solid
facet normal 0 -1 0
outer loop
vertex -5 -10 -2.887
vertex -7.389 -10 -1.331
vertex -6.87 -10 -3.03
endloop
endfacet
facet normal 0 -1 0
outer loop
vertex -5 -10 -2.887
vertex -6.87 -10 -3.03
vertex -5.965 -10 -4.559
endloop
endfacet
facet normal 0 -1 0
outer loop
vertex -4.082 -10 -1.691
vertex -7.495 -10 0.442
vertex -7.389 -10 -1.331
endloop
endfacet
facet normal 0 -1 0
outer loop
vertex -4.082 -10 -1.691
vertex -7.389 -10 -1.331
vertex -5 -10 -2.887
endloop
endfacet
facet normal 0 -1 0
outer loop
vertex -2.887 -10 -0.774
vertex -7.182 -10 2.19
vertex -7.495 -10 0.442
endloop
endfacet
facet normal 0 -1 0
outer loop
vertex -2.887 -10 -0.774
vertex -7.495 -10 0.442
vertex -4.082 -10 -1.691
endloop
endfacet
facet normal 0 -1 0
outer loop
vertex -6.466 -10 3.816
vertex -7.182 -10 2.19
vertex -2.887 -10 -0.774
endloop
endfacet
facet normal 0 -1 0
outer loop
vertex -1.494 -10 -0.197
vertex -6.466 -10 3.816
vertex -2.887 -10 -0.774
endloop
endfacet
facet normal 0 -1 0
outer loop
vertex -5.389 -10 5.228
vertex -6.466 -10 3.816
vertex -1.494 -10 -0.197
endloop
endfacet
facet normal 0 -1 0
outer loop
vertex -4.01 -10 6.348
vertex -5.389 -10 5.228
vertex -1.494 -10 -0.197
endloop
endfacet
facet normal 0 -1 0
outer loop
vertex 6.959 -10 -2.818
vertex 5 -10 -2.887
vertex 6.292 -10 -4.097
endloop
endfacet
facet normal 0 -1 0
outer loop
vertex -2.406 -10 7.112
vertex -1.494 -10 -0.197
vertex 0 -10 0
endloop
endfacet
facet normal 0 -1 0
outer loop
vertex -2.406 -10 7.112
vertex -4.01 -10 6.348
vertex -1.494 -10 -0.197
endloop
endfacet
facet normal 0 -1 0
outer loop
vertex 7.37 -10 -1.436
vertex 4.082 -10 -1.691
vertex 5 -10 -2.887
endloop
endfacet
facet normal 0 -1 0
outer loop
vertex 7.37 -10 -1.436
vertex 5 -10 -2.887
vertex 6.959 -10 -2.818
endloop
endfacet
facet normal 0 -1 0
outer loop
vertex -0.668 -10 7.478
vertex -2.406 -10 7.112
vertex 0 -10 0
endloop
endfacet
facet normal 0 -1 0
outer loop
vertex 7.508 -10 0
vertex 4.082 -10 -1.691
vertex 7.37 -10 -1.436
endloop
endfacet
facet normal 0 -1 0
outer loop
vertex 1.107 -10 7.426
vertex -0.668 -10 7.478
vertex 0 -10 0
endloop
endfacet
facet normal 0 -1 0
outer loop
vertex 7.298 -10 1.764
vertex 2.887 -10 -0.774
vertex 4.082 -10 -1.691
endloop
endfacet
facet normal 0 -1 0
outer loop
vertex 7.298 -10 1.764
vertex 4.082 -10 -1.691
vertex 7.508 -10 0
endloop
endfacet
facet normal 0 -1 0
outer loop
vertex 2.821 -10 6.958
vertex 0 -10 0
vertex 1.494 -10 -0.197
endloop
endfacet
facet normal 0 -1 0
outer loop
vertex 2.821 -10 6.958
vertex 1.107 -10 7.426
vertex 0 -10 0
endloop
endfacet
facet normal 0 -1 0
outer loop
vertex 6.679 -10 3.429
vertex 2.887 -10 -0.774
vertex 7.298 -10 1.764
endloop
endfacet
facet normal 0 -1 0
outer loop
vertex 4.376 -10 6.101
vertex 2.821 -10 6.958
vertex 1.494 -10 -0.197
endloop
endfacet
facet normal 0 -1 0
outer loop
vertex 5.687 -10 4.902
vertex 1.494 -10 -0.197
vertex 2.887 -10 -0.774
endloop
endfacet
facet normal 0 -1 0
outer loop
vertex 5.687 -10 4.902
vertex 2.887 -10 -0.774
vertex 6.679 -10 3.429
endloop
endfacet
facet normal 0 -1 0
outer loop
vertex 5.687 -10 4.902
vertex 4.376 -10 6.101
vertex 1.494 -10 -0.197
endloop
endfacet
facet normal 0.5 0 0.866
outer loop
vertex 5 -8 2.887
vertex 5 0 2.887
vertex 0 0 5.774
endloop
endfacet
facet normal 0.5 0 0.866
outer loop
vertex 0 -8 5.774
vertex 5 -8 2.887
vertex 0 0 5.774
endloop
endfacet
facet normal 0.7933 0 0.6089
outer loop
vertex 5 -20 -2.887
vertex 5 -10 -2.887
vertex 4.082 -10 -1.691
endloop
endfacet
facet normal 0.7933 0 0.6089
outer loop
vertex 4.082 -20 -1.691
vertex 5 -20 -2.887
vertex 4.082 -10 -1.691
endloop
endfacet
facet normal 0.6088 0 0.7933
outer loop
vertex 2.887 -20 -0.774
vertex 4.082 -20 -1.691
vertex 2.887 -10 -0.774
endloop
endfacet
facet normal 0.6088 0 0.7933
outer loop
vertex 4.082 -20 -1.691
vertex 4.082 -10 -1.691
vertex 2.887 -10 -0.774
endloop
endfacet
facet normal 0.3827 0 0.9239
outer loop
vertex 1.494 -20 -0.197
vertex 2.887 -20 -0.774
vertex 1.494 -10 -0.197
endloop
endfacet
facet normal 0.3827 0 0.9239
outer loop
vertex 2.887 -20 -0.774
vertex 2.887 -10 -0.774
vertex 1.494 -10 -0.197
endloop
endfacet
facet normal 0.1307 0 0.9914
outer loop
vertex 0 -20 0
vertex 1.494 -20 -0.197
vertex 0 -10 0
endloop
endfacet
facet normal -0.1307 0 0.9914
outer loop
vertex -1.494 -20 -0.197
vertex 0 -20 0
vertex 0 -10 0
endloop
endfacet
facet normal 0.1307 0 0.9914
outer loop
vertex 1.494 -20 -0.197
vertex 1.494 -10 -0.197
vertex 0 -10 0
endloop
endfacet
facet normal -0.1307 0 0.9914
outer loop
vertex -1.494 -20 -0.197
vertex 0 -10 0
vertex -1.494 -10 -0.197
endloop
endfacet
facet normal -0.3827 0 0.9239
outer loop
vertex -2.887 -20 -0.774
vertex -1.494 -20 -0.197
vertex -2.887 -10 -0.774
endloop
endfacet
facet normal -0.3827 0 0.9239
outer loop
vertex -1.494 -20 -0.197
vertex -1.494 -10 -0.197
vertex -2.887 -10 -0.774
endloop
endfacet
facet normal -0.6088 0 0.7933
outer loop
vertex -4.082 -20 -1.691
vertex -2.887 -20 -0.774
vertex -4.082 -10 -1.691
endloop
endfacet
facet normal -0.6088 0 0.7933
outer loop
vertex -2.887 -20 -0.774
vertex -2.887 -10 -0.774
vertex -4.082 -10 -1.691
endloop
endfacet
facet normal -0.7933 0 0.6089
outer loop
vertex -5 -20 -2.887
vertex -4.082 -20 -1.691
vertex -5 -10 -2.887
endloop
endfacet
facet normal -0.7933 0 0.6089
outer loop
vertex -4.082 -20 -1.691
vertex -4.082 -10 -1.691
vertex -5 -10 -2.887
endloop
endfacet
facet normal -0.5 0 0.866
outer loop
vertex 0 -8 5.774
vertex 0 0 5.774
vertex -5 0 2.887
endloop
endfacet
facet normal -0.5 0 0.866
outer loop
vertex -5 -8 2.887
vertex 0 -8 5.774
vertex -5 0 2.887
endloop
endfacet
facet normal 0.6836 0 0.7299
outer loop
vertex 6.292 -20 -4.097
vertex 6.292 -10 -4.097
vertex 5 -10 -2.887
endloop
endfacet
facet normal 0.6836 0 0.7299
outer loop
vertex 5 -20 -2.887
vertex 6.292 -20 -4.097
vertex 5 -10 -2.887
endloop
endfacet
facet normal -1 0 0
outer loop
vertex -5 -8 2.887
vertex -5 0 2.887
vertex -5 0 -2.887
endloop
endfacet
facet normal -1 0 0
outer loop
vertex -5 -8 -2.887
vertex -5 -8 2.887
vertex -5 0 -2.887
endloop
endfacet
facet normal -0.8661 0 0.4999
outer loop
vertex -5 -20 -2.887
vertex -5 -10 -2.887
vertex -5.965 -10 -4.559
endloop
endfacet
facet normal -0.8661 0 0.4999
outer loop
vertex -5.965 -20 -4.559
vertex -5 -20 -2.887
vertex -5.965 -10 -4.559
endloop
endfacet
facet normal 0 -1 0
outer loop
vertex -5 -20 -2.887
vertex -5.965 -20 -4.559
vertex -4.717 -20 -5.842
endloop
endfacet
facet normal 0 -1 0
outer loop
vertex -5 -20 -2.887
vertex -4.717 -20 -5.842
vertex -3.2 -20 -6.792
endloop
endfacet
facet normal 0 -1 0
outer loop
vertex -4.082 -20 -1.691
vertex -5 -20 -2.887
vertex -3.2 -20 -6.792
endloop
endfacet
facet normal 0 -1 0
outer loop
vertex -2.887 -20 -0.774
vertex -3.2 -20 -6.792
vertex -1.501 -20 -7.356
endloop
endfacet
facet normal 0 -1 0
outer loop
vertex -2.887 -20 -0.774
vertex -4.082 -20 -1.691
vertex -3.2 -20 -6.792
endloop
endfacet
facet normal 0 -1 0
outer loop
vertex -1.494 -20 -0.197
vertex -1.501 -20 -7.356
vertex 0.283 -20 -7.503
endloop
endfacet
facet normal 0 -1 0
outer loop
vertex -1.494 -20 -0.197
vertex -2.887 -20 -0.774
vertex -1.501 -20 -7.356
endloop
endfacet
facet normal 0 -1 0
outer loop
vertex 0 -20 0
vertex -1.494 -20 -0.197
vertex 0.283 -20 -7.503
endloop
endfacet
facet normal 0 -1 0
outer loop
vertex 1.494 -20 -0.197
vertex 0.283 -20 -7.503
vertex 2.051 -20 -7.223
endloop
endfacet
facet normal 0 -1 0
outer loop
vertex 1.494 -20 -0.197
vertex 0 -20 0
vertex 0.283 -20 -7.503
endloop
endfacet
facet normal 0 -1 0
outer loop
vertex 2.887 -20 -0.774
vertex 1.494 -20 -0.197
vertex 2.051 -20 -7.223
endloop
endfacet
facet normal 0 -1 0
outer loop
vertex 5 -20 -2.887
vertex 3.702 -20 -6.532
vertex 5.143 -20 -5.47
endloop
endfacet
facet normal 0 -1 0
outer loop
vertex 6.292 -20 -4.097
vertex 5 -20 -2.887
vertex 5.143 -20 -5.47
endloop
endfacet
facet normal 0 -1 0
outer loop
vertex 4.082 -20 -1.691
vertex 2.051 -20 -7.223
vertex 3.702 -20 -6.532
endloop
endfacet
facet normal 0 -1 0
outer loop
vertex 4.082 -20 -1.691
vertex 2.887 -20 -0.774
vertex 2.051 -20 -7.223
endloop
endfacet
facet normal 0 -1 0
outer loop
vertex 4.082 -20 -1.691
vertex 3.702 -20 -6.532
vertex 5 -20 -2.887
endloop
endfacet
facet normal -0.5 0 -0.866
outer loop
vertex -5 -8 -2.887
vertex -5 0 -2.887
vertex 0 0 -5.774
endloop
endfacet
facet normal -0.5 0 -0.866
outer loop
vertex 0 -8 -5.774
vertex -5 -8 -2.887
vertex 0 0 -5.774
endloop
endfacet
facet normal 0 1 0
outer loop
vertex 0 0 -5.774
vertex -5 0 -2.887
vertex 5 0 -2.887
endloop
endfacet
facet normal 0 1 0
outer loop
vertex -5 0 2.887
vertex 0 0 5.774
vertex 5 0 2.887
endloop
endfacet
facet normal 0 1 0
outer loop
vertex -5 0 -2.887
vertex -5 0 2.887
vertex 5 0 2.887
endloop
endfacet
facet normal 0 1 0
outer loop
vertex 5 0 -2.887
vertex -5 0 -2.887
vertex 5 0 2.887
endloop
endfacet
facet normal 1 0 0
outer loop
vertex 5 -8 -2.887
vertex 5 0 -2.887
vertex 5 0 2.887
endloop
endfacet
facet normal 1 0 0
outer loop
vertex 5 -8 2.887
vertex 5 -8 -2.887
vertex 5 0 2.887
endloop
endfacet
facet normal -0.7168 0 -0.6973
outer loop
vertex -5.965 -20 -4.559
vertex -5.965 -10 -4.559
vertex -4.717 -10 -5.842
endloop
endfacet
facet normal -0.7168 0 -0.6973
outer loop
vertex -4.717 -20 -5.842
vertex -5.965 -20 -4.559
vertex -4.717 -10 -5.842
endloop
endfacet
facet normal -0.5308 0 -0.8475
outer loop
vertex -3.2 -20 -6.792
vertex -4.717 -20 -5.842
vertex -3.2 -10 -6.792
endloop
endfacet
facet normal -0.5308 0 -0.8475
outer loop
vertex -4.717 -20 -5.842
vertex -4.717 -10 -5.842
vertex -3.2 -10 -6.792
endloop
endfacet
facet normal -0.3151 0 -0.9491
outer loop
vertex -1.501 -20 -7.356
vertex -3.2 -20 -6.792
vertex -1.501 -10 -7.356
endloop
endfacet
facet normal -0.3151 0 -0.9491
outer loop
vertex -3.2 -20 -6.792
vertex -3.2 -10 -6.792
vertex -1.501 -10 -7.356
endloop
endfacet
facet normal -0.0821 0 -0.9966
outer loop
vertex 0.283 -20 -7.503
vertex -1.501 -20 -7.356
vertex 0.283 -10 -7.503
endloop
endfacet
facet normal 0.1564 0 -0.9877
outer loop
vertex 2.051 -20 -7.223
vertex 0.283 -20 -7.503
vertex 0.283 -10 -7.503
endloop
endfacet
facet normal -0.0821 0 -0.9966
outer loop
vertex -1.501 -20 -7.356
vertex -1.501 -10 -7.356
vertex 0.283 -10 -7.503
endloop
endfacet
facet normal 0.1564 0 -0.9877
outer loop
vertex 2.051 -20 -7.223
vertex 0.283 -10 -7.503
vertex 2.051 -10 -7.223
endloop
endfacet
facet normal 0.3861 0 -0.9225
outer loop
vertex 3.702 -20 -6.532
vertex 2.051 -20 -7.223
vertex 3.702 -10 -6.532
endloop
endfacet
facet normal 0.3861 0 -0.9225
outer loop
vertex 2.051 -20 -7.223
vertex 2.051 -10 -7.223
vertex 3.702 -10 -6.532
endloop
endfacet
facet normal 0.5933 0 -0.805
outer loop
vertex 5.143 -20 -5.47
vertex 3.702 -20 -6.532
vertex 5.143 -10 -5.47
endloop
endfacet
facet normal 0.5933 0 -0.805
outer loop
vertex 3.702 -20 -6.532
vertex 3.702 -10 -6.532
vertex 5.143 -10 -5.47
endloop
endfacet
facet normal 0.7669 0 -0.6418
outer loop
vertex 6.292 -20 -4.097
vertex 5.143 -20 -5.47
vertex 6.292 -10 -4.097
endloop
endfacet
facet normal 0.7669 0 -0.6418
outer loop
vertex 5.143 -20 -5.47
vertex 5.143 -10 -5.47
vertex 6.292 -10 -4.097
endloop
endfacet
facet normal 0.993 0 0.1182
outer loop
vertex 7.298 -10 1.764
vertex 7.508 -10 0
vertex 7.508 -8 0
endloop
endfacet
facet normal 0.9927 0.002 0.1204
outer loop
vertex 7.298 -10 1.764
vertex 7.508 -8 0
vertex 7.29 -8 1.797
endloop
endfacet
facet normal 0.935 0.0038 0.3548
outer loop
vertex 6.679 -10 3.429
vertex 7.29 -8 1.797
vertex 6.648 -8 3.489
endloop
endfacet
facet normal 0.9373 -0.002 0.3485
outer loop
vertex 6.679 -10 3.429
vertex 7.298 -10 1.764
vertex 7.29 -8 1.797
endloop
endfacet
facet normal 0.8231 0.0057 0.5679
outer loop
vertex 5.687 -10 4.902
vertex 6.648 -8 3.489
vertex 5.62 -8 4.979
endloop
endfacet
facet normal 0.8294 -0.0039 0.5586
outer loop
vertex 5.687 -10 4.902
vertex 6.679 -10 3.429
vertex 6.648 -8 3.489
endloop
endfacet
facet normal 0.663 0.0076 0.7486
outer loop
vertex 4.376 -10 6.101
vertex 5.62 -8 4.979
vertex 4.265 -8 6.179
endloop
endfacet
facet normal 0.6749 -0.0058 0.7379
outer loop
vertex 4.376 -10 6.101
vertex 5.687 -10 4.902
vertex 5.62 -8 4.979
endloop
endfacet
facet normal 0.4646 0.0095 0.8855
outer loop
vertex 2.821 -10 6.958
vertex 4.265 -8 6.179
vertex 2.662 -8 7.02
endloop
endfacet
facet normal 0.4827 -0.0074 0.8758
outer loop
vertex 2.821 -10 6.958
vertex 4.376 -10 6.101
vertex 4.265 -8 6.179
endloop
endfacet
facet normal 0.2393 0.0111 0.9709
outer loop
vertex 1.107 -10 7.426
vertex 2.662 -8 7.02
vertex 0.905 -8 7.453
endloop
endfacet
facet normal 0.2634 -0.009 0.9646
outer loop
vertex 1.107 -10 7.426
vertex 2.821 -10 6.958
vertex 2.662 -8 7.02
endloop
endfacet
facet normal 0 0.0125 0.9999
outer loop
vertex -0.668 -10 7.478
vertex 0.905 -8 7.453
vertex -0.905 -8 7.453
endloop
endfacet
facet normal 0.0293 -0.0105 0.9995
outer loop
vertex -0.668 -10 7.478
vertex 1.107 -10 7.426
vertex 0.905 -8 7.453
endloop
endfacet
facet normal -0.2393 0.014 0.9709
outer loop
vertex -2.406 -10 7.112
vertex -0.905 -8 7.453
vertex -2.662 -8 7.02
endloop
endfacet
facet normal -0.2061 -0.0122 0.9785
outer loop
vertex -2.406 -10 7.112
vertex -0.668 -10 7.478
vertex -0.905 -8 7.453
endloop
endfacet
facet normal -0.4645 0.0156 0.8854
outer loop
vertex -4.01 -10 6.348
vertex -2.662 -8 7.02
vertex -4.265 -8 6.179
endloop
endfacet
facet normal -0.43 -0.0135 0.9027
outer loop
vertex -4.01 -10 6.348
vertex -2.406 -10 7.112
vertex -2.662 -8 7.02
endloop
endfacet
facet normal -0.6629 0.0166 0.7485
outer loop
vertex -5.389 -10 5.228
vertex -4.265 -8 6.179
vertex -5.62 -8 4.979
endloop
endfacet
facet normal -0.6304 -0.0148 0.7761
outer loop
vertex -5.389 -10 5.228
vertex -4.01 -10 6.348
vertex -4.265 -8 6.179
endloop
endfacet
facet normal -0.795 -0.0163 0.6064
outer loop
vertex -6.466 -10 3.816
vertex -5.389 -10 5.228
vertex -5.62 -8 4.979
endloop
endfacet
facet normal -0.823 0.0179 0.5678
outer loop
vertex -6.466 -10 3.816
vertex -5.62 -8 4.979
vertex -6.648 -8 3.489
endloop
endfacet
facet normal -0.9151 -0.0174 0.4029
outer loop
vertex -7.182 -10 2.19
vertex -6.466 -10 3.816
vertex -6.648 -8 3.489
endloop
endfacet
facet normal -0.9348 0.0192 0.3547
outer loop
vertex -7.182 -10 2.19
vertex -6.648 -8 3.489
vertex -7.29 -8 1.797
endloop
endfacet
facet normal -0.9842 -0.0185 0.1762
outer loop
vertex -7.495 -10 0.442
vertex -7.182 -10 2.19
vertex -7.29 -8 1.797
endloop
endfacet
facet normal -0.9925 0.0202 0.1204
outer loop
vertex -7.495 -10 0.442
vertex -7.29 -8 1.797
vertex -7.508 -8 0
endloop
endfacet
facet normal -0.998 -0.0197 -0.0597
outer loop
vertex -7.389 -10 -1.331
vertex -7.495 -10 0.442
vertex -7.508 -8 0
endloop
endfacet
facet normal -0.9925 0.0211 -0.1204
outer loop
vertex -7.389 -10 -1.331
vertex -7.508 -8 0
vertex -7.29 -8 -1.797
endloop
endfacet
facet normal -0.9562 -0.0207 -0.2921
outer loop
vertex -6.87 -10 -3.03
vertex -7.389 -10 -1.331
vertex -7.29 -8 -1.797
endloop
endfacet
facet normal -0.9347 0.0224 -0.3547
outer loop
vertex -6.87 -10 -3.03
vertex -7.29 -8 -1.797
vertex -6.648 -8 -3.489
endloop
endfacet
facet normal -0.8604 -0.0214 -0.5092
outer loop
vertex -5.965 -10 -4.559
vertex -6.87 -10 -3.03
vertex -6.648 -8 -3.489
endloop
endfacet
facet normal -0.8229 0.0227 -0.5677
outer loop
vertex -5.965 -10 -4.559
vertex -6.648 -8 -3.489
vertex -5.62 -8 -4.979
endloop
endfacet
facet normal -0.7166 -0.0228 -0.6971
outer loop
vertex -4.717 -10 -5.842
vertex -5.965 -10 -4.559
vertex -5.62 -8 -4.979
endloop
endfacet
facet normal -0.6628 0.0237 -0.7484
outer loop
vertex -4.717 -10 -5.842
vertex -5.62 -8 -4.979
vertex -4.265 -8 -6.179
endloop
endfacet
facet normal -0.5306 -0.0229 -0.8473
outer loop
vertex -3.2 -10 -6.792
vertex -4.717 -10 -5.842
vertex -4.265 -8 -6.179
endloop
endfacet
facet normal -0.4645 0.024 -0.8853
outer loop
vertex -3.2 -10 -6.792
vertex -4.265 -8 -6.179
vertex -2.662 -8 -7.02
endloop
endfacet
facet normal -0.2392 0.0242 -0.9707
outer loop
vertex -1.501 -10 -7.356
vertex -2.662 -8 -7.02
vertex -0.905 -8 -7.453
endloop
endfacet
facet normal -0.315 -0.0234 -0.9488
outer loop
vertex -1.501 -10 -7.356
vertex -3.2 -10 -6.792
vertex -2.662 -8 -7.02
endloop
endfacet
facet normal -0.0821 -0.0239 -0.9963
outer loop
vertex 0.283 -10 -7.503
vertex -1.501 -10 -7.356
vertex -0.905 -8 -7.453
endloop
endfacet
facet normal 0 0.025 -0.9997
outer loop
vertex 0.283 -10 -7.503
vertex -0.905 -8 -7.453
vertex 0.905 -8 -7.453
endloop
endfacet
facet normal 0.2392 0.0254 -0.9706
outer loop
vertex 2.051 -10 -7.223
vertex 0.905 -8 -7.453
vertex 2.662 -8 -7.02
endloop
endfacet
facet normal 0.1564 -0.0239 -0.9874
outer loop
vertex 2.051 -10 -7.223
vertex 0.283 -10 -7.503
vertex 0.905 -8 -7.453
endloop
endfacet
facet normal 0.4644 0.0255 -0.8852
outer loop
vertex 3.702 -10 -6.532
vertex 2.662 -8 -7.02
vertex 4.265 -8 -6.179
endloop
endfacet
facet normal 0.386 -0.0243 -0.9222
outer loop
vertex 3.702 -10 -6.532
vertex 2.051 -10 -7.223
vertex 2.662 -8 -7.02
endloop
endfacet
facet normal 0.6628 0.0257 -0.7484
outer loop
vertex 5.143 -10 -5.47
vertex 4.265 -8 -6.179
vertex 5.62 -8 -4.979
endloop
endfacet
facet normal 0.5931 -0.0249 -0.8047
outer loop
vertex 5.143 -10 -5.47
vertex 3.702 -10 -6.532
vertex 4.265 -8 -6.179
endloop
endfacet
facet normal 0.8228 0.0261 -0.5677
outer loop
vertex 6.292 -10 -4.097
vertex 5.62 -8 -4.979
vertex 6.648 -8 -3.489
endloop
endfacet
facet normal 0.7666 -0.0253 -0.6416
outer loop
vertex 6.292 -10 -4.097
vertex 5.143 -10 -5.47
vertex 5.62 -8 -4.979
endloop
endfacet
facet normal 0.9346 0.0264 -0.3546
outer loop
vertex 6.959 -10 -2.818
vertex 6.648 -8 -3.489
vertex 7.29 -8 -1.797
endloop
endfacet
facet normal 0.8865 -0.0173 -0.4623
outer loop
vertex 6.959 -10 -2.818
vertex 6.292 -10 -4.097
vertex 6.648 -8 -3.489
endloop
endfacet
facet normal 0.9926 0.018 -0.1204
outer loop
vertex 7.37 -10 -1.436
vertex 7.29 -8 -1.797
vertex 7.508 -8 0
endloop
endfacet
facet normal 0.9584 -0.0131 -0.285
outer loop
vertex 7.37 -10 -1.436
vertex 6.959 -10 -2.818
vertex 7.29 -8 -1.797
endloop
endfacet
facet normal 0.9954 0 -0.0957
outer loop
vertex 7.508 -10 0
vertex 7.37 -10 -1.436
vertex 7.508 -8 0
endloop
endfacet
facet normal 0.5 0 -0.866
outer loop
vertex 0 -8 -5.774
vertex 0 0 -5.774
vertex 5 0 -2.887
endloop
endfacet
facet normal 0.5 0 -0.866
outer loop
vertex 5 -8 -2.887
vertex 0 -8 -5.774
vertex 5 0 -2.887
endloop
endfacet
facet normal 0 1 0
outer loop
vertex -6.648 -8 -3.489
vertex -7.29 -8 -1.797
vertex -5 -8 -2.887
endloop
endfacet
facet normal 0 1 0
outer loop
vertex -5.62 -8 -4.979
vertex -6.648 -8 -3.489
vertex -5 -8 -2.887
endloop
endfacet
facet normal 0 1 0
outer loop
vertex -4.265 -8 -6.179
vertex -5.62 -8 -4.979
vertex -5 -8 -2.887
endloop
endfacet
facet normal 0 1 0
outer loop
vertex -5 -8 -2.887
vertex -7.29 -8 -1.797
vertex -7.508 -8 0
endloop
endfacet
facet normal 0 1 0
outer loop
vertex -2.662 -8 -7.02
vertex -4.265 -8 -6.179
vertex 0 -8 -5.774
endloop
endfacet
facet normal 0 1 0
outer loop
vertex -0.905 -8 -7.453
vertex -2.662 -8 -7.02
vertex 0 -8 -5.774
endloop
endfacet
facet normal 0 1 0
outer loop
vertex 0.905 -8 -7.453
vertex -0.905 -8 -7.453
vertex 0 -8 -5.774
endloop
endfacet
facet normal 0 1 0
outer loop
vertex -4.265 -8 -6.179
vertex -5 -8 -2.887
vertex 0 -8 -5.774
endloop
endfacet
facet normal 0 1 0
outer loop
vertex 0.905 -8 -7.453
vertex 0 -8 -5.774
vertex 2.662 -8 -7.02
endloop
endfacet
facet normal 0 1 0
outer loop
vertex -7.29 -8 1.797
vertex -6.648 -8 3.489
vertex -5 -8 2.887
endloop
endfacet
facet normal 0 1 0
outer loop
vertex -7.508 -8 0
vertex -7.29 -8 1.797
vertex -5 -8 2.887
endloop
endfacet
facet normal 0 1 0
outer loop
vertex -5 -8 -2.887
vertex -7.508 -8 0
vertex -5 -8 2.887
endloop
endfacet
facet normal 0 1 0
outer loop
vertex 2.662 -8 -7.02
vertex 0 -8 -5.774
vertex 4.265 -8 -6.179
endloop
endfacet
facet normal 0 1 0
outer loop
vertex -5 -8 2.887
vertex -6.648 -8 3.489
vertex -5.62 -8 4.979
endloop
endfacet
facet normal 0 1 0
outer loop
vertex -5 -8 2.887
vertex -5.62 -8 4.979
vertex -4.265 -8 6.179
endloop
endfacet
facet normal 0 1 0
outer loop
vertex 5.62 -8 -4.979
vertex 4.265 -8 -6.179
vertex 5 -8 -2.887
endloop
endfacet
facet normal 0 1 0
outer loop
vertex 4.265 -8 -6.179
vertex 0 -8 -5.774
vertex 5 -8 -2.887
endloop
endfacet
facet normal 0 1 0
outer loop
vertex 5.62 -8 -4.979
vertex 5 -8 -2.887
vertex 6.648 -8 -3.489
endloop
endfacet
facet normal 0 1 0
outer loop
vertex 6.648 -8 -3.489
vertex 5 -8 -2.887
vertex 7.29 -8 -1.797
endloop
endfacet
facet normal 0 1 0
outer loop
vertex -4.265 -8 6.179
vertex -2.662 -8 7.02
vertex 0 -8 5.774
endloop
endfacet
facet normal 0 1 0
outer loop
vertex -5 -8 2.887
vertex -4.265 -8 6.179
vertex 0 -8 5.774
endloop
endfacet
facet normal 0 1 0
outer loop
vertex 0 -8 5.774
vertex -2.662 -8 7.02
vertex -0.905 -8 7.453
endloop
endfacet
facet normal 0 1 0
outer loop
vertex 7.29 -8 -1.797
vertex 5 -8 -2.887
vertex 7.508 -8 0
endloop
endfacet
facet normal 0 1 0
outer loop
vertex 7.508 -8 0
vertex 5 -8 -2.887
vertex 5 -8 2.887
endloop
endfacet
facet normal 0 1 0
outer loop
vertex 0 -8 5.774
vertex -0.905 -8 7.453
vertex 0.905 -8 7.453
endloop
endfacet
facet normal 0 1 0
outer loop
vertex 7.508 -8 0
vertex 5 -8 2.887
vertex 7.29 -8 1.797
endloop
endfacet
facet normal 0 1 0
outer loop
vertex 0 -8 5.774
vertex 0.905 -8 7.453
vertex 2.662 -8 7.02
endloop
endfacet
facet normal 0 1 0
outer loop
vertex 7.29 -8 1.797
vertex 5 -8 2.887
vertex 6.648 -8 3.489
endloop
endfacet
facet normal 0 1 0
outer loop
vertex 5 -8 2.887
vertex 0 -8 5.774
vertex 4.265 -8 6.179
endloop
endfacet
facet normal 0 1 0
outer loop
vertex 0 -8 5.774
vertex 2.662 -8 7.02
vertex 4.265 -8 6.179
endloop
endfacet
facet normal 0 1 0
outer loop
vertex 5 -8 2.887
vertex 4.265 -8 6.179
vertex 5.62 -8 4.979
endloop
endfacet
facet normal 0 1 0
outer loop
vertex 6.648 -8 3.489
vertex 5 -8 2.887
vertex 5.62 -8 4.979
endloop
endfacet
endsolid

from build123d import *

# Parameters (mm, degrees)
F1_DEPTH = 10
F3_DEPTH = 10
F4_R     = 7.5080974038
F5_DEPTH = 2
F7_DEPTH = 10


with BuildPart() as f1:
    # F0 (on Front) → F1 (new body)
    with BuildSketch(Plane.XZ):
        Polygon((5, 2.8867513459), (0, 5.7735026919), (-5, 2.8867513459), (-5, -2.8867513459), (0, -5.7735026919), (5, -2.8867513459), align=None)
    extrude(amount=F1_DEPTH)

    # F2 (on face) → F3 (join)
    with BuildSketch(Plane.XZ.offset(10)):
        with BuildLine():
            Line((0, -5.7735026919), (5, -2.8867513459))
            ThreePointArc((5, -2.8867513459), (0, 0), (-5, -2.8867513459))
            Line((-5, -2.8867513459), (0, -5.7735026919))
        make_face()
    extrude(amount=F3_DEPTH)

    # F4 (on face) → F5 (join)
    with BuildSketch(Plane.XZ.offset(10)):
        Circle(F4_R)
        with BuildLine():
            ThreePointArc((5, -2.8867513459), (0, 0), (-5, -2.8867513459))
            Line((-5, -2.8867513459), (-5, 2.8867513459))
            Line((-5, 2.8867513459), (0, 5.7735026919))
            Line((0, 5.7735026919), (5, 2.8867513459))
            Line((5, 2.8867513459), (5, -2.8867513459))
        make_face(mode=Mode.SUBTRACT)
    extrude(amount=-F5_DEPTH)

    # F6 (on face) → F7 (join, through all)
    with BuildSketch(Plane.XZ.offset(10)):
        with BuildLine():
            Line((0, -5.7735026919), (-5, -2.8867513459))
            Line((-5, -2.8867513459), (-5.9654795228, -4.5590109331))
            ThreePointArc((-5.9654795228, -4.5590109331), (0.28281982, -7.5027687939), (6.2917700935, -4.0969690889))
            Line((6.2917700935, -4.0969690889), (5, -2.8867513459))
            Line((5, -2.8867513459), (0, -5.7735026919))
        make_face()
    extrude(amount=F7_DEPTH)


solid = f1.part
